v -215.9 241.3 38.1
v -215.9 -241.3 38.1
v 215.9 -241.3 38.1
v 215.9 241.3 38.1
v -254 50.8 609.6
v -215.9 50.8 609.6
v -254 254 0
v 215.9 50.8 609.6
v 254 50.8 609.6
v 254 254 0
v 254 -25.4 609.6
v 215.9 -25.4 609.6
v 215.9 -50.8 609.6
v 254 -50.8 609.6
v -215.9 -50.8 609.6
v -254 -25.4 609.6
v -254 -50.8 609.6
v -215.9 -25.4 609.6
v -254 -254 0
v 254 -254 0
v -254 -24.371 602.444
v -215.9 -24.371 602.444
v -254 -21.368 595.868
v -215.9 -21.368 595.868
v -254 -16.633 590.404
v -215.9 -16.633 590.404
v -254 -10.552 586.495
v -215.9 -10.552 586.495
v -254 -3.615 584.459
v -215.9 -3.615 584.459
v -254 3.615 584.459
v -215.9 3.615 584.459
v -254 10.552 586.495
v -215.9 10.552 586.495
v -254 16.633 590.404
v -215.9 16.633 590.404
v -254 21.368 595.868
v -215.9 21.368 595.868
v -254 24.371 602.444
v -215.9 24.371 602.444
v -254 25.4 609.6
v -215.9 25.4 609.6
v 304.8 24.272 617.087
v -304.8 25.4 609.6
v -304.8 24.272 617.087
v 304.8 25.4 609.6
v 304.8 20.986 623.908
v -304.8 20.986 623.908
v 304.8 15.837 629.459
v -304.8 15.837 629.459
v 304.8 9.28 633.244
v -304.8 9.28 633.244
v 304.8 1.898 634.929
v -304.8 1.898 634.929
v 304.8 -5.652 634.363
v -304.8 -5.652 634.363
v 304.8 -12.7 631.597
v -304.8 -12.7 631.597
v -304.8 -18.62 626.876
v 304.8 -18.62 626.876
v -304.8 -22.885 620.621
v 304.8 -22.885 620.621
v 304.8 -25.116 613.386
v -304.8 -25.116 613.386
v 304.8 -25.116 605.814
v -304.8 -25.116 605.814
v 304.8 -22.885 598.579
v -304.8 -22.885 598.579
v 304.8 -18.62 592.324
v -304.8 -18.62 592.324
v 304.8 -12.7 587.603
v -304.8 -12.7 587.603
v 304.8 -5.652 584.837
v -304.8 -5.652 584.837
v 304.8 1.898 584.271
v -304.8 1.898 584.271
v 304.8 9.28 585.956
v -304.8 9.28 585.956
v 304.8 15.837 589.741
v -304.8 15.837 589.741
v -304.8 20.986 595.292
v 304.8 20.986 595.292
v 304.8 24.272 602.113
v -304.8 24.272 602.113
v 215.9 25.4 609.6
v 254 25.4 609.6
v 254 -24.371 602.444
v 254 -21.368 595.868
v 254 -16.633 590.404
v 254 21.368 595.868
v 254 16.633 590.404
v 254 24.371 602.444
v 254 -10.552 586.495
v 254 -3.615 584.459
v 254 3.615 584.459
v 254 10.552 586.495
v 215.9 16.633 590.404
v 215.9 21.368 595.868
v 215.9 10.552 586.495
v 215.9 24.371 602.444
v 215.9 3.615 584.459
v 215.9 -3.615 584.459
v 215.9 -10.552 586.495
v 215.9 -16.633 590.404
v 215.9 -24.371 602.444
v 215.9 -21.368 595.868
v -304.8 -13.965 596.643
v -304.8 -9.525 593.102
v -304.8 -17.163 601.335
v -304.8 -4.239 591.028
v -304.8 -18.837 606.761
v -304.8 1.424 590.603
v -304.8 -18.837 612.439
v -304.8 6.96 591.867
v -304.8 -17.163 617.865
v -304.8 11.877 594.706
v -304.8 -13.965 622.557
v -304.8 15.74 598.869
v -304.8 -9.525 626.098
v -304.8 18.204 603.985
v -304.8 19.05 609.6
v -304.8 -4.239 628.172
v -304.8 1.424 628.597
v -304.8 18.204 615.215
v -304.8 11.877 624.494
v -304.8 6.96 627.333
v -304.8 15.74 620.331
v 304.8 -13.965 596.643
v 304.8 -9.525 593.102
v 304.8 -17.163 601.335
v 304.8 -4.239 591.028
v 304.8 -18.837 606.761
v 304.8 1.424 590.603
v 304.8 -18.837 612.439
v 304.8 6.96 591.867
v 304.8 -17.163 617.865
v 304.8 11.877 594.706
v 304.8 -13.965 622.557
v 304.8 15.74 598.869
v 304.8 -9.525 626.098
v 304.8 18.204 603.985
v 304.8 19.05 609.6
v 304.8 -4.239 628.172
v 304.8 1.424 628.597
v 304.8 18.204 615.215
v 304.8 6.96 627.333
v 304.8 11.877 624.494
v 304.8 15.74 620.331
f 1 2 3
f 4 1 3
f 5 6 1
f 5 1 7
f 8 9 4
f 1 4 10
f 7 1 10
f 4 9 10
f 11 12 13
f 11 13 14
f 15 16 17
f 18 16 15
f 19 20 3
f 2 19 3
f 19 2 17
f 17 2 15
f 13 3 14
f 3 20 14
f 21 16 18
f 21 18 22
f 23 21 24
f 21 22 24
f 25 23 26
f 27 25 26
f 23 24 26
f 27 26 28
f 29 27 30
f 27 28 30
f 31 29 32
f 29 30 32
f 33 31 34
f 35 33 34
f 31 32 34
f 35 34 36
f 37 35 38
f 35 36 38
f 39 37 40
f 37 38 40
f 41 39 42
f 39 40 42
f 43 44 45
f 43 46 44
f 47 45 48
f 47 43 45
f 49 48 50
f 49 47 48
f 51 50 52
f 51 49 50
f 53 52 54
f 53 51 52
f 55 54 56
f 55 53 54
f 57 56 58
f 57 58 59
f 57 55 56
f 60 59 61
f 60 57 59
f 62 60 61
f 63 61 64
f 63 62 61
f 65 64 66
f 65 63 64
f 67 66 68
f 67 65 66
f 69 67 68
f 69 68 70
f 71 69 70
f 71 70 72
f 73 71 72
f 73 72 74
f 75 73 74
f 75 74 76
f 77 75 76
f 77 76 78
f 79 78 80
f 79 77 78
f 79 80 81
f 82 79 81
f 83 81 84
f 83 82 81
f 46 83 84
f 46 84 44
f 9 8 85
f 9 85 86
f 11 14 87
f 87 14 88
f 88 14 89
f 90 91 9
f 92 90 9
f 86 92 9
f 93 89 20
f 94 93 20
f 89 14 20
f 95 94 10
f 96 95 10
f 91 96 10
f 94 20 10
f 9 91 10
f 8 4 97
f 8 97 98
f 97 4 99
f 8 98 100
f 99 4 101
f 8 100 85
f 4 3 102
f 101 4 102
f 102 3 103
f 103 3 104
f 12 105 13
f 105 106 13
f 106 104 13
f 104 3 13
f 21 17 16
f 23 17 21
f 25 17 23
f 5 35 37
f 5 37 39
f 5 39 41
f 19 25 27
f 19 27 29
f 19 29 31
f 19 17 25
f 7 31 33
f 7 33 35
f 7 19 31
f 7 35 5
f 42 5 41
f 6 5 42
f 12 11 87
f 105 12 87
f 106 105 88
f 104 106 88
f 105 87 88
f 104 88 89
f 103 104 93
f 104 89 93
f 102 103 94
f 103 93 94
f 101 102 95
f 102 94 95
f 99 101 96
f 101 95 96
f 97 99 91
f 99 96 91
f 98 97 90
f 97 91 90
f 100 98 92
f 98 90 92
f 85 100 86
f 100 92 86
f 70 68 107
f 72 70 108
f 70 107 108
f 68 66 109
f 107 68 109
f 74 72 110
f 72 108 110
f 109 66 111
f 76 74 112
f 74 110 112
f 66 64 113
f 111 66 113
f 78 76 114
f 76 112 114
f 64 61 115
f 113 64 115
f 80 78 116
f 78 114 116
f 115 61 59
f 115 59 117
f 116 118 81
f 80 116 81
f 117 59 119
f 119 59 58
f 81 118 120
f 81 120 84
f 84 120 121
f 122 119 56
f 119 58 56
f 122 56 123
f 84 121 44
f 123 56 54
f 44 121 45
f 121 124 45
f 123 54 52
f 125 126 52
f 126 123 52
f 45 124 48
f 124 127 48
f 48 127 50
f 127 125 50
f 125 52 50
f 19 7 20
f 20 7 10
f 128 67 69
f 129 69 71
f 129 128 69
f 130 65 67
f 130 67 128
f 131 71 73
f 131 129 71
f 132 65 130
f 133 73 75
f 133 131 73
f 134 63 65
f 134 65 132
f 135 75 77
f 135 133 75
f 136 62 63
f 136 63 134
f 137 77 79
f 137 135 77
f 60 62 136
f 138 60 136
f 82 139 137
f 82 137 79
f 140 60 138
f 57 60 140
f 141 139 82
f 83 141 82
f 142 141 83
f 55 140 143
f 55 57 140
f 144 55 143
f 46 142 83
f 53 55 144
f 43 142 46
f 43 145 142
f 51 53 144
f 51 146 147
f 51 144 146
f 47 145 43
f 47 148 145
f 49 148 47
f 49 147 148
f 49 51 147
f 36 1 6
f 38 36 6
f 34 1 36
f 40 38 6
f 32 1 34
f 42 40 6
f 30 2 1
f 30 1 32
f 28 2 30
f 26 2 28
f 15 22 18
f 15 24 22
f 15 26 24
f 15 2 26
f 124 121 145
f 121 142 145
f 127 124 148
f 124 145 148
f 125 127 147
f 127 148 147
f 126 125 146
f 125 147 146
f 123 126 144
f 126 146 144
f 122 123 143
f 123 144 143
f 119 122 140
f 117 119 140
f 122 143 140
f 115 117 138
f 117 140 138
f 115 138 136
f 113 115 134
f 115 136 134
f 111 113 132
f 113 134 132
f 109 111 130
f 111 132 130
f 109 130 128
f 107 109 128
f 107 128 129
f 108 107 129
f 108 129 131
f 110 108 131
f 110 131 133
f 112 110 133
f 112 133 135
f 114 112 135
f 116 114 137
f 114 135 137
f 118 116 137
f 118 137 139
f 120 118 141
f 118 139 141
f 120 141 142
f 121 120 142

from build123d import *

# Parameters (mm, degrees)
F0_W          = 508
F0_H          = 508
F1_DEPTH      = 609.6
F2_W          = 431.8
F2_H          = 571.5
F3_DEPTH      = 508.001
F5_DEPTH      = 508.001
F7_DEPTH      = 50.8
F7_DEPTH_BACK = 558.8
F8_T          = -6.35


with BuildPart() as f1:
    # F0 (on Top) → F1 (new body)
    with BuildSketch(Plane.XY):
        Rectangle(F0_W, F0_H)
    extrude(amount=F1_DEPTH)

    # F2 (on face) → F3 (cut, through all)
    with BuildSketch(Plane.XZ.offset(254)):
        with Locations((0, 323.85)):
            Rectangle(F2_W, F2_H)
    extrude(amount=-F3_DEPTH, mode=Mode.SUBTRACT)

    # F4 (on face) → F5 (cut, through all)
    with BuildSketch(Plane.YZ.offset(254)):
        Polygon((-254, 609.6), (-254, 0), (-50.8, 609.6), align=None)
        Polygon((254, 0), (254, 609.6), (50.8, 609.6), align=None)
        with BuildLine():
            ThreePointArc((-25.4, 609.6), (0, 584.2), (25.4, 609.6))
            Line((25.4, 609.6), (-25.4, 609.6))
        make_face()
    extrude(amount=-F5_DEPTH, mode=Mode.SUBTRACT)


with BuildPart() as f7:
    # F6 (on face) → F7 (new body, two sides)
    with BuildSketch(Plane.YZ.offset(254)) as f7_sk:
        with BuildLine():
            ThreePointArc((-25.4, 609.6), (0, 584.2), (25.4, 609.6))
            ThreePointArc((25.4, 609.6), (0, 635), (-25.4, 609.6))
        make_face()
    extrude(amount=F7_DEPTH)
    extrude(f7_sk.sketch, amount=-F7_DEPTH_BACK)

    # F8
    f8_openings = [f7.faces().sort_by_distance(p)[0] for p in [
        (304.8, 0, 609.6),
        (-304.8, 0, 609.6),
    ]]
    offset(amount=F8_T, openings=f8_openings)


solid = Compound([f1.part, f7.part])
